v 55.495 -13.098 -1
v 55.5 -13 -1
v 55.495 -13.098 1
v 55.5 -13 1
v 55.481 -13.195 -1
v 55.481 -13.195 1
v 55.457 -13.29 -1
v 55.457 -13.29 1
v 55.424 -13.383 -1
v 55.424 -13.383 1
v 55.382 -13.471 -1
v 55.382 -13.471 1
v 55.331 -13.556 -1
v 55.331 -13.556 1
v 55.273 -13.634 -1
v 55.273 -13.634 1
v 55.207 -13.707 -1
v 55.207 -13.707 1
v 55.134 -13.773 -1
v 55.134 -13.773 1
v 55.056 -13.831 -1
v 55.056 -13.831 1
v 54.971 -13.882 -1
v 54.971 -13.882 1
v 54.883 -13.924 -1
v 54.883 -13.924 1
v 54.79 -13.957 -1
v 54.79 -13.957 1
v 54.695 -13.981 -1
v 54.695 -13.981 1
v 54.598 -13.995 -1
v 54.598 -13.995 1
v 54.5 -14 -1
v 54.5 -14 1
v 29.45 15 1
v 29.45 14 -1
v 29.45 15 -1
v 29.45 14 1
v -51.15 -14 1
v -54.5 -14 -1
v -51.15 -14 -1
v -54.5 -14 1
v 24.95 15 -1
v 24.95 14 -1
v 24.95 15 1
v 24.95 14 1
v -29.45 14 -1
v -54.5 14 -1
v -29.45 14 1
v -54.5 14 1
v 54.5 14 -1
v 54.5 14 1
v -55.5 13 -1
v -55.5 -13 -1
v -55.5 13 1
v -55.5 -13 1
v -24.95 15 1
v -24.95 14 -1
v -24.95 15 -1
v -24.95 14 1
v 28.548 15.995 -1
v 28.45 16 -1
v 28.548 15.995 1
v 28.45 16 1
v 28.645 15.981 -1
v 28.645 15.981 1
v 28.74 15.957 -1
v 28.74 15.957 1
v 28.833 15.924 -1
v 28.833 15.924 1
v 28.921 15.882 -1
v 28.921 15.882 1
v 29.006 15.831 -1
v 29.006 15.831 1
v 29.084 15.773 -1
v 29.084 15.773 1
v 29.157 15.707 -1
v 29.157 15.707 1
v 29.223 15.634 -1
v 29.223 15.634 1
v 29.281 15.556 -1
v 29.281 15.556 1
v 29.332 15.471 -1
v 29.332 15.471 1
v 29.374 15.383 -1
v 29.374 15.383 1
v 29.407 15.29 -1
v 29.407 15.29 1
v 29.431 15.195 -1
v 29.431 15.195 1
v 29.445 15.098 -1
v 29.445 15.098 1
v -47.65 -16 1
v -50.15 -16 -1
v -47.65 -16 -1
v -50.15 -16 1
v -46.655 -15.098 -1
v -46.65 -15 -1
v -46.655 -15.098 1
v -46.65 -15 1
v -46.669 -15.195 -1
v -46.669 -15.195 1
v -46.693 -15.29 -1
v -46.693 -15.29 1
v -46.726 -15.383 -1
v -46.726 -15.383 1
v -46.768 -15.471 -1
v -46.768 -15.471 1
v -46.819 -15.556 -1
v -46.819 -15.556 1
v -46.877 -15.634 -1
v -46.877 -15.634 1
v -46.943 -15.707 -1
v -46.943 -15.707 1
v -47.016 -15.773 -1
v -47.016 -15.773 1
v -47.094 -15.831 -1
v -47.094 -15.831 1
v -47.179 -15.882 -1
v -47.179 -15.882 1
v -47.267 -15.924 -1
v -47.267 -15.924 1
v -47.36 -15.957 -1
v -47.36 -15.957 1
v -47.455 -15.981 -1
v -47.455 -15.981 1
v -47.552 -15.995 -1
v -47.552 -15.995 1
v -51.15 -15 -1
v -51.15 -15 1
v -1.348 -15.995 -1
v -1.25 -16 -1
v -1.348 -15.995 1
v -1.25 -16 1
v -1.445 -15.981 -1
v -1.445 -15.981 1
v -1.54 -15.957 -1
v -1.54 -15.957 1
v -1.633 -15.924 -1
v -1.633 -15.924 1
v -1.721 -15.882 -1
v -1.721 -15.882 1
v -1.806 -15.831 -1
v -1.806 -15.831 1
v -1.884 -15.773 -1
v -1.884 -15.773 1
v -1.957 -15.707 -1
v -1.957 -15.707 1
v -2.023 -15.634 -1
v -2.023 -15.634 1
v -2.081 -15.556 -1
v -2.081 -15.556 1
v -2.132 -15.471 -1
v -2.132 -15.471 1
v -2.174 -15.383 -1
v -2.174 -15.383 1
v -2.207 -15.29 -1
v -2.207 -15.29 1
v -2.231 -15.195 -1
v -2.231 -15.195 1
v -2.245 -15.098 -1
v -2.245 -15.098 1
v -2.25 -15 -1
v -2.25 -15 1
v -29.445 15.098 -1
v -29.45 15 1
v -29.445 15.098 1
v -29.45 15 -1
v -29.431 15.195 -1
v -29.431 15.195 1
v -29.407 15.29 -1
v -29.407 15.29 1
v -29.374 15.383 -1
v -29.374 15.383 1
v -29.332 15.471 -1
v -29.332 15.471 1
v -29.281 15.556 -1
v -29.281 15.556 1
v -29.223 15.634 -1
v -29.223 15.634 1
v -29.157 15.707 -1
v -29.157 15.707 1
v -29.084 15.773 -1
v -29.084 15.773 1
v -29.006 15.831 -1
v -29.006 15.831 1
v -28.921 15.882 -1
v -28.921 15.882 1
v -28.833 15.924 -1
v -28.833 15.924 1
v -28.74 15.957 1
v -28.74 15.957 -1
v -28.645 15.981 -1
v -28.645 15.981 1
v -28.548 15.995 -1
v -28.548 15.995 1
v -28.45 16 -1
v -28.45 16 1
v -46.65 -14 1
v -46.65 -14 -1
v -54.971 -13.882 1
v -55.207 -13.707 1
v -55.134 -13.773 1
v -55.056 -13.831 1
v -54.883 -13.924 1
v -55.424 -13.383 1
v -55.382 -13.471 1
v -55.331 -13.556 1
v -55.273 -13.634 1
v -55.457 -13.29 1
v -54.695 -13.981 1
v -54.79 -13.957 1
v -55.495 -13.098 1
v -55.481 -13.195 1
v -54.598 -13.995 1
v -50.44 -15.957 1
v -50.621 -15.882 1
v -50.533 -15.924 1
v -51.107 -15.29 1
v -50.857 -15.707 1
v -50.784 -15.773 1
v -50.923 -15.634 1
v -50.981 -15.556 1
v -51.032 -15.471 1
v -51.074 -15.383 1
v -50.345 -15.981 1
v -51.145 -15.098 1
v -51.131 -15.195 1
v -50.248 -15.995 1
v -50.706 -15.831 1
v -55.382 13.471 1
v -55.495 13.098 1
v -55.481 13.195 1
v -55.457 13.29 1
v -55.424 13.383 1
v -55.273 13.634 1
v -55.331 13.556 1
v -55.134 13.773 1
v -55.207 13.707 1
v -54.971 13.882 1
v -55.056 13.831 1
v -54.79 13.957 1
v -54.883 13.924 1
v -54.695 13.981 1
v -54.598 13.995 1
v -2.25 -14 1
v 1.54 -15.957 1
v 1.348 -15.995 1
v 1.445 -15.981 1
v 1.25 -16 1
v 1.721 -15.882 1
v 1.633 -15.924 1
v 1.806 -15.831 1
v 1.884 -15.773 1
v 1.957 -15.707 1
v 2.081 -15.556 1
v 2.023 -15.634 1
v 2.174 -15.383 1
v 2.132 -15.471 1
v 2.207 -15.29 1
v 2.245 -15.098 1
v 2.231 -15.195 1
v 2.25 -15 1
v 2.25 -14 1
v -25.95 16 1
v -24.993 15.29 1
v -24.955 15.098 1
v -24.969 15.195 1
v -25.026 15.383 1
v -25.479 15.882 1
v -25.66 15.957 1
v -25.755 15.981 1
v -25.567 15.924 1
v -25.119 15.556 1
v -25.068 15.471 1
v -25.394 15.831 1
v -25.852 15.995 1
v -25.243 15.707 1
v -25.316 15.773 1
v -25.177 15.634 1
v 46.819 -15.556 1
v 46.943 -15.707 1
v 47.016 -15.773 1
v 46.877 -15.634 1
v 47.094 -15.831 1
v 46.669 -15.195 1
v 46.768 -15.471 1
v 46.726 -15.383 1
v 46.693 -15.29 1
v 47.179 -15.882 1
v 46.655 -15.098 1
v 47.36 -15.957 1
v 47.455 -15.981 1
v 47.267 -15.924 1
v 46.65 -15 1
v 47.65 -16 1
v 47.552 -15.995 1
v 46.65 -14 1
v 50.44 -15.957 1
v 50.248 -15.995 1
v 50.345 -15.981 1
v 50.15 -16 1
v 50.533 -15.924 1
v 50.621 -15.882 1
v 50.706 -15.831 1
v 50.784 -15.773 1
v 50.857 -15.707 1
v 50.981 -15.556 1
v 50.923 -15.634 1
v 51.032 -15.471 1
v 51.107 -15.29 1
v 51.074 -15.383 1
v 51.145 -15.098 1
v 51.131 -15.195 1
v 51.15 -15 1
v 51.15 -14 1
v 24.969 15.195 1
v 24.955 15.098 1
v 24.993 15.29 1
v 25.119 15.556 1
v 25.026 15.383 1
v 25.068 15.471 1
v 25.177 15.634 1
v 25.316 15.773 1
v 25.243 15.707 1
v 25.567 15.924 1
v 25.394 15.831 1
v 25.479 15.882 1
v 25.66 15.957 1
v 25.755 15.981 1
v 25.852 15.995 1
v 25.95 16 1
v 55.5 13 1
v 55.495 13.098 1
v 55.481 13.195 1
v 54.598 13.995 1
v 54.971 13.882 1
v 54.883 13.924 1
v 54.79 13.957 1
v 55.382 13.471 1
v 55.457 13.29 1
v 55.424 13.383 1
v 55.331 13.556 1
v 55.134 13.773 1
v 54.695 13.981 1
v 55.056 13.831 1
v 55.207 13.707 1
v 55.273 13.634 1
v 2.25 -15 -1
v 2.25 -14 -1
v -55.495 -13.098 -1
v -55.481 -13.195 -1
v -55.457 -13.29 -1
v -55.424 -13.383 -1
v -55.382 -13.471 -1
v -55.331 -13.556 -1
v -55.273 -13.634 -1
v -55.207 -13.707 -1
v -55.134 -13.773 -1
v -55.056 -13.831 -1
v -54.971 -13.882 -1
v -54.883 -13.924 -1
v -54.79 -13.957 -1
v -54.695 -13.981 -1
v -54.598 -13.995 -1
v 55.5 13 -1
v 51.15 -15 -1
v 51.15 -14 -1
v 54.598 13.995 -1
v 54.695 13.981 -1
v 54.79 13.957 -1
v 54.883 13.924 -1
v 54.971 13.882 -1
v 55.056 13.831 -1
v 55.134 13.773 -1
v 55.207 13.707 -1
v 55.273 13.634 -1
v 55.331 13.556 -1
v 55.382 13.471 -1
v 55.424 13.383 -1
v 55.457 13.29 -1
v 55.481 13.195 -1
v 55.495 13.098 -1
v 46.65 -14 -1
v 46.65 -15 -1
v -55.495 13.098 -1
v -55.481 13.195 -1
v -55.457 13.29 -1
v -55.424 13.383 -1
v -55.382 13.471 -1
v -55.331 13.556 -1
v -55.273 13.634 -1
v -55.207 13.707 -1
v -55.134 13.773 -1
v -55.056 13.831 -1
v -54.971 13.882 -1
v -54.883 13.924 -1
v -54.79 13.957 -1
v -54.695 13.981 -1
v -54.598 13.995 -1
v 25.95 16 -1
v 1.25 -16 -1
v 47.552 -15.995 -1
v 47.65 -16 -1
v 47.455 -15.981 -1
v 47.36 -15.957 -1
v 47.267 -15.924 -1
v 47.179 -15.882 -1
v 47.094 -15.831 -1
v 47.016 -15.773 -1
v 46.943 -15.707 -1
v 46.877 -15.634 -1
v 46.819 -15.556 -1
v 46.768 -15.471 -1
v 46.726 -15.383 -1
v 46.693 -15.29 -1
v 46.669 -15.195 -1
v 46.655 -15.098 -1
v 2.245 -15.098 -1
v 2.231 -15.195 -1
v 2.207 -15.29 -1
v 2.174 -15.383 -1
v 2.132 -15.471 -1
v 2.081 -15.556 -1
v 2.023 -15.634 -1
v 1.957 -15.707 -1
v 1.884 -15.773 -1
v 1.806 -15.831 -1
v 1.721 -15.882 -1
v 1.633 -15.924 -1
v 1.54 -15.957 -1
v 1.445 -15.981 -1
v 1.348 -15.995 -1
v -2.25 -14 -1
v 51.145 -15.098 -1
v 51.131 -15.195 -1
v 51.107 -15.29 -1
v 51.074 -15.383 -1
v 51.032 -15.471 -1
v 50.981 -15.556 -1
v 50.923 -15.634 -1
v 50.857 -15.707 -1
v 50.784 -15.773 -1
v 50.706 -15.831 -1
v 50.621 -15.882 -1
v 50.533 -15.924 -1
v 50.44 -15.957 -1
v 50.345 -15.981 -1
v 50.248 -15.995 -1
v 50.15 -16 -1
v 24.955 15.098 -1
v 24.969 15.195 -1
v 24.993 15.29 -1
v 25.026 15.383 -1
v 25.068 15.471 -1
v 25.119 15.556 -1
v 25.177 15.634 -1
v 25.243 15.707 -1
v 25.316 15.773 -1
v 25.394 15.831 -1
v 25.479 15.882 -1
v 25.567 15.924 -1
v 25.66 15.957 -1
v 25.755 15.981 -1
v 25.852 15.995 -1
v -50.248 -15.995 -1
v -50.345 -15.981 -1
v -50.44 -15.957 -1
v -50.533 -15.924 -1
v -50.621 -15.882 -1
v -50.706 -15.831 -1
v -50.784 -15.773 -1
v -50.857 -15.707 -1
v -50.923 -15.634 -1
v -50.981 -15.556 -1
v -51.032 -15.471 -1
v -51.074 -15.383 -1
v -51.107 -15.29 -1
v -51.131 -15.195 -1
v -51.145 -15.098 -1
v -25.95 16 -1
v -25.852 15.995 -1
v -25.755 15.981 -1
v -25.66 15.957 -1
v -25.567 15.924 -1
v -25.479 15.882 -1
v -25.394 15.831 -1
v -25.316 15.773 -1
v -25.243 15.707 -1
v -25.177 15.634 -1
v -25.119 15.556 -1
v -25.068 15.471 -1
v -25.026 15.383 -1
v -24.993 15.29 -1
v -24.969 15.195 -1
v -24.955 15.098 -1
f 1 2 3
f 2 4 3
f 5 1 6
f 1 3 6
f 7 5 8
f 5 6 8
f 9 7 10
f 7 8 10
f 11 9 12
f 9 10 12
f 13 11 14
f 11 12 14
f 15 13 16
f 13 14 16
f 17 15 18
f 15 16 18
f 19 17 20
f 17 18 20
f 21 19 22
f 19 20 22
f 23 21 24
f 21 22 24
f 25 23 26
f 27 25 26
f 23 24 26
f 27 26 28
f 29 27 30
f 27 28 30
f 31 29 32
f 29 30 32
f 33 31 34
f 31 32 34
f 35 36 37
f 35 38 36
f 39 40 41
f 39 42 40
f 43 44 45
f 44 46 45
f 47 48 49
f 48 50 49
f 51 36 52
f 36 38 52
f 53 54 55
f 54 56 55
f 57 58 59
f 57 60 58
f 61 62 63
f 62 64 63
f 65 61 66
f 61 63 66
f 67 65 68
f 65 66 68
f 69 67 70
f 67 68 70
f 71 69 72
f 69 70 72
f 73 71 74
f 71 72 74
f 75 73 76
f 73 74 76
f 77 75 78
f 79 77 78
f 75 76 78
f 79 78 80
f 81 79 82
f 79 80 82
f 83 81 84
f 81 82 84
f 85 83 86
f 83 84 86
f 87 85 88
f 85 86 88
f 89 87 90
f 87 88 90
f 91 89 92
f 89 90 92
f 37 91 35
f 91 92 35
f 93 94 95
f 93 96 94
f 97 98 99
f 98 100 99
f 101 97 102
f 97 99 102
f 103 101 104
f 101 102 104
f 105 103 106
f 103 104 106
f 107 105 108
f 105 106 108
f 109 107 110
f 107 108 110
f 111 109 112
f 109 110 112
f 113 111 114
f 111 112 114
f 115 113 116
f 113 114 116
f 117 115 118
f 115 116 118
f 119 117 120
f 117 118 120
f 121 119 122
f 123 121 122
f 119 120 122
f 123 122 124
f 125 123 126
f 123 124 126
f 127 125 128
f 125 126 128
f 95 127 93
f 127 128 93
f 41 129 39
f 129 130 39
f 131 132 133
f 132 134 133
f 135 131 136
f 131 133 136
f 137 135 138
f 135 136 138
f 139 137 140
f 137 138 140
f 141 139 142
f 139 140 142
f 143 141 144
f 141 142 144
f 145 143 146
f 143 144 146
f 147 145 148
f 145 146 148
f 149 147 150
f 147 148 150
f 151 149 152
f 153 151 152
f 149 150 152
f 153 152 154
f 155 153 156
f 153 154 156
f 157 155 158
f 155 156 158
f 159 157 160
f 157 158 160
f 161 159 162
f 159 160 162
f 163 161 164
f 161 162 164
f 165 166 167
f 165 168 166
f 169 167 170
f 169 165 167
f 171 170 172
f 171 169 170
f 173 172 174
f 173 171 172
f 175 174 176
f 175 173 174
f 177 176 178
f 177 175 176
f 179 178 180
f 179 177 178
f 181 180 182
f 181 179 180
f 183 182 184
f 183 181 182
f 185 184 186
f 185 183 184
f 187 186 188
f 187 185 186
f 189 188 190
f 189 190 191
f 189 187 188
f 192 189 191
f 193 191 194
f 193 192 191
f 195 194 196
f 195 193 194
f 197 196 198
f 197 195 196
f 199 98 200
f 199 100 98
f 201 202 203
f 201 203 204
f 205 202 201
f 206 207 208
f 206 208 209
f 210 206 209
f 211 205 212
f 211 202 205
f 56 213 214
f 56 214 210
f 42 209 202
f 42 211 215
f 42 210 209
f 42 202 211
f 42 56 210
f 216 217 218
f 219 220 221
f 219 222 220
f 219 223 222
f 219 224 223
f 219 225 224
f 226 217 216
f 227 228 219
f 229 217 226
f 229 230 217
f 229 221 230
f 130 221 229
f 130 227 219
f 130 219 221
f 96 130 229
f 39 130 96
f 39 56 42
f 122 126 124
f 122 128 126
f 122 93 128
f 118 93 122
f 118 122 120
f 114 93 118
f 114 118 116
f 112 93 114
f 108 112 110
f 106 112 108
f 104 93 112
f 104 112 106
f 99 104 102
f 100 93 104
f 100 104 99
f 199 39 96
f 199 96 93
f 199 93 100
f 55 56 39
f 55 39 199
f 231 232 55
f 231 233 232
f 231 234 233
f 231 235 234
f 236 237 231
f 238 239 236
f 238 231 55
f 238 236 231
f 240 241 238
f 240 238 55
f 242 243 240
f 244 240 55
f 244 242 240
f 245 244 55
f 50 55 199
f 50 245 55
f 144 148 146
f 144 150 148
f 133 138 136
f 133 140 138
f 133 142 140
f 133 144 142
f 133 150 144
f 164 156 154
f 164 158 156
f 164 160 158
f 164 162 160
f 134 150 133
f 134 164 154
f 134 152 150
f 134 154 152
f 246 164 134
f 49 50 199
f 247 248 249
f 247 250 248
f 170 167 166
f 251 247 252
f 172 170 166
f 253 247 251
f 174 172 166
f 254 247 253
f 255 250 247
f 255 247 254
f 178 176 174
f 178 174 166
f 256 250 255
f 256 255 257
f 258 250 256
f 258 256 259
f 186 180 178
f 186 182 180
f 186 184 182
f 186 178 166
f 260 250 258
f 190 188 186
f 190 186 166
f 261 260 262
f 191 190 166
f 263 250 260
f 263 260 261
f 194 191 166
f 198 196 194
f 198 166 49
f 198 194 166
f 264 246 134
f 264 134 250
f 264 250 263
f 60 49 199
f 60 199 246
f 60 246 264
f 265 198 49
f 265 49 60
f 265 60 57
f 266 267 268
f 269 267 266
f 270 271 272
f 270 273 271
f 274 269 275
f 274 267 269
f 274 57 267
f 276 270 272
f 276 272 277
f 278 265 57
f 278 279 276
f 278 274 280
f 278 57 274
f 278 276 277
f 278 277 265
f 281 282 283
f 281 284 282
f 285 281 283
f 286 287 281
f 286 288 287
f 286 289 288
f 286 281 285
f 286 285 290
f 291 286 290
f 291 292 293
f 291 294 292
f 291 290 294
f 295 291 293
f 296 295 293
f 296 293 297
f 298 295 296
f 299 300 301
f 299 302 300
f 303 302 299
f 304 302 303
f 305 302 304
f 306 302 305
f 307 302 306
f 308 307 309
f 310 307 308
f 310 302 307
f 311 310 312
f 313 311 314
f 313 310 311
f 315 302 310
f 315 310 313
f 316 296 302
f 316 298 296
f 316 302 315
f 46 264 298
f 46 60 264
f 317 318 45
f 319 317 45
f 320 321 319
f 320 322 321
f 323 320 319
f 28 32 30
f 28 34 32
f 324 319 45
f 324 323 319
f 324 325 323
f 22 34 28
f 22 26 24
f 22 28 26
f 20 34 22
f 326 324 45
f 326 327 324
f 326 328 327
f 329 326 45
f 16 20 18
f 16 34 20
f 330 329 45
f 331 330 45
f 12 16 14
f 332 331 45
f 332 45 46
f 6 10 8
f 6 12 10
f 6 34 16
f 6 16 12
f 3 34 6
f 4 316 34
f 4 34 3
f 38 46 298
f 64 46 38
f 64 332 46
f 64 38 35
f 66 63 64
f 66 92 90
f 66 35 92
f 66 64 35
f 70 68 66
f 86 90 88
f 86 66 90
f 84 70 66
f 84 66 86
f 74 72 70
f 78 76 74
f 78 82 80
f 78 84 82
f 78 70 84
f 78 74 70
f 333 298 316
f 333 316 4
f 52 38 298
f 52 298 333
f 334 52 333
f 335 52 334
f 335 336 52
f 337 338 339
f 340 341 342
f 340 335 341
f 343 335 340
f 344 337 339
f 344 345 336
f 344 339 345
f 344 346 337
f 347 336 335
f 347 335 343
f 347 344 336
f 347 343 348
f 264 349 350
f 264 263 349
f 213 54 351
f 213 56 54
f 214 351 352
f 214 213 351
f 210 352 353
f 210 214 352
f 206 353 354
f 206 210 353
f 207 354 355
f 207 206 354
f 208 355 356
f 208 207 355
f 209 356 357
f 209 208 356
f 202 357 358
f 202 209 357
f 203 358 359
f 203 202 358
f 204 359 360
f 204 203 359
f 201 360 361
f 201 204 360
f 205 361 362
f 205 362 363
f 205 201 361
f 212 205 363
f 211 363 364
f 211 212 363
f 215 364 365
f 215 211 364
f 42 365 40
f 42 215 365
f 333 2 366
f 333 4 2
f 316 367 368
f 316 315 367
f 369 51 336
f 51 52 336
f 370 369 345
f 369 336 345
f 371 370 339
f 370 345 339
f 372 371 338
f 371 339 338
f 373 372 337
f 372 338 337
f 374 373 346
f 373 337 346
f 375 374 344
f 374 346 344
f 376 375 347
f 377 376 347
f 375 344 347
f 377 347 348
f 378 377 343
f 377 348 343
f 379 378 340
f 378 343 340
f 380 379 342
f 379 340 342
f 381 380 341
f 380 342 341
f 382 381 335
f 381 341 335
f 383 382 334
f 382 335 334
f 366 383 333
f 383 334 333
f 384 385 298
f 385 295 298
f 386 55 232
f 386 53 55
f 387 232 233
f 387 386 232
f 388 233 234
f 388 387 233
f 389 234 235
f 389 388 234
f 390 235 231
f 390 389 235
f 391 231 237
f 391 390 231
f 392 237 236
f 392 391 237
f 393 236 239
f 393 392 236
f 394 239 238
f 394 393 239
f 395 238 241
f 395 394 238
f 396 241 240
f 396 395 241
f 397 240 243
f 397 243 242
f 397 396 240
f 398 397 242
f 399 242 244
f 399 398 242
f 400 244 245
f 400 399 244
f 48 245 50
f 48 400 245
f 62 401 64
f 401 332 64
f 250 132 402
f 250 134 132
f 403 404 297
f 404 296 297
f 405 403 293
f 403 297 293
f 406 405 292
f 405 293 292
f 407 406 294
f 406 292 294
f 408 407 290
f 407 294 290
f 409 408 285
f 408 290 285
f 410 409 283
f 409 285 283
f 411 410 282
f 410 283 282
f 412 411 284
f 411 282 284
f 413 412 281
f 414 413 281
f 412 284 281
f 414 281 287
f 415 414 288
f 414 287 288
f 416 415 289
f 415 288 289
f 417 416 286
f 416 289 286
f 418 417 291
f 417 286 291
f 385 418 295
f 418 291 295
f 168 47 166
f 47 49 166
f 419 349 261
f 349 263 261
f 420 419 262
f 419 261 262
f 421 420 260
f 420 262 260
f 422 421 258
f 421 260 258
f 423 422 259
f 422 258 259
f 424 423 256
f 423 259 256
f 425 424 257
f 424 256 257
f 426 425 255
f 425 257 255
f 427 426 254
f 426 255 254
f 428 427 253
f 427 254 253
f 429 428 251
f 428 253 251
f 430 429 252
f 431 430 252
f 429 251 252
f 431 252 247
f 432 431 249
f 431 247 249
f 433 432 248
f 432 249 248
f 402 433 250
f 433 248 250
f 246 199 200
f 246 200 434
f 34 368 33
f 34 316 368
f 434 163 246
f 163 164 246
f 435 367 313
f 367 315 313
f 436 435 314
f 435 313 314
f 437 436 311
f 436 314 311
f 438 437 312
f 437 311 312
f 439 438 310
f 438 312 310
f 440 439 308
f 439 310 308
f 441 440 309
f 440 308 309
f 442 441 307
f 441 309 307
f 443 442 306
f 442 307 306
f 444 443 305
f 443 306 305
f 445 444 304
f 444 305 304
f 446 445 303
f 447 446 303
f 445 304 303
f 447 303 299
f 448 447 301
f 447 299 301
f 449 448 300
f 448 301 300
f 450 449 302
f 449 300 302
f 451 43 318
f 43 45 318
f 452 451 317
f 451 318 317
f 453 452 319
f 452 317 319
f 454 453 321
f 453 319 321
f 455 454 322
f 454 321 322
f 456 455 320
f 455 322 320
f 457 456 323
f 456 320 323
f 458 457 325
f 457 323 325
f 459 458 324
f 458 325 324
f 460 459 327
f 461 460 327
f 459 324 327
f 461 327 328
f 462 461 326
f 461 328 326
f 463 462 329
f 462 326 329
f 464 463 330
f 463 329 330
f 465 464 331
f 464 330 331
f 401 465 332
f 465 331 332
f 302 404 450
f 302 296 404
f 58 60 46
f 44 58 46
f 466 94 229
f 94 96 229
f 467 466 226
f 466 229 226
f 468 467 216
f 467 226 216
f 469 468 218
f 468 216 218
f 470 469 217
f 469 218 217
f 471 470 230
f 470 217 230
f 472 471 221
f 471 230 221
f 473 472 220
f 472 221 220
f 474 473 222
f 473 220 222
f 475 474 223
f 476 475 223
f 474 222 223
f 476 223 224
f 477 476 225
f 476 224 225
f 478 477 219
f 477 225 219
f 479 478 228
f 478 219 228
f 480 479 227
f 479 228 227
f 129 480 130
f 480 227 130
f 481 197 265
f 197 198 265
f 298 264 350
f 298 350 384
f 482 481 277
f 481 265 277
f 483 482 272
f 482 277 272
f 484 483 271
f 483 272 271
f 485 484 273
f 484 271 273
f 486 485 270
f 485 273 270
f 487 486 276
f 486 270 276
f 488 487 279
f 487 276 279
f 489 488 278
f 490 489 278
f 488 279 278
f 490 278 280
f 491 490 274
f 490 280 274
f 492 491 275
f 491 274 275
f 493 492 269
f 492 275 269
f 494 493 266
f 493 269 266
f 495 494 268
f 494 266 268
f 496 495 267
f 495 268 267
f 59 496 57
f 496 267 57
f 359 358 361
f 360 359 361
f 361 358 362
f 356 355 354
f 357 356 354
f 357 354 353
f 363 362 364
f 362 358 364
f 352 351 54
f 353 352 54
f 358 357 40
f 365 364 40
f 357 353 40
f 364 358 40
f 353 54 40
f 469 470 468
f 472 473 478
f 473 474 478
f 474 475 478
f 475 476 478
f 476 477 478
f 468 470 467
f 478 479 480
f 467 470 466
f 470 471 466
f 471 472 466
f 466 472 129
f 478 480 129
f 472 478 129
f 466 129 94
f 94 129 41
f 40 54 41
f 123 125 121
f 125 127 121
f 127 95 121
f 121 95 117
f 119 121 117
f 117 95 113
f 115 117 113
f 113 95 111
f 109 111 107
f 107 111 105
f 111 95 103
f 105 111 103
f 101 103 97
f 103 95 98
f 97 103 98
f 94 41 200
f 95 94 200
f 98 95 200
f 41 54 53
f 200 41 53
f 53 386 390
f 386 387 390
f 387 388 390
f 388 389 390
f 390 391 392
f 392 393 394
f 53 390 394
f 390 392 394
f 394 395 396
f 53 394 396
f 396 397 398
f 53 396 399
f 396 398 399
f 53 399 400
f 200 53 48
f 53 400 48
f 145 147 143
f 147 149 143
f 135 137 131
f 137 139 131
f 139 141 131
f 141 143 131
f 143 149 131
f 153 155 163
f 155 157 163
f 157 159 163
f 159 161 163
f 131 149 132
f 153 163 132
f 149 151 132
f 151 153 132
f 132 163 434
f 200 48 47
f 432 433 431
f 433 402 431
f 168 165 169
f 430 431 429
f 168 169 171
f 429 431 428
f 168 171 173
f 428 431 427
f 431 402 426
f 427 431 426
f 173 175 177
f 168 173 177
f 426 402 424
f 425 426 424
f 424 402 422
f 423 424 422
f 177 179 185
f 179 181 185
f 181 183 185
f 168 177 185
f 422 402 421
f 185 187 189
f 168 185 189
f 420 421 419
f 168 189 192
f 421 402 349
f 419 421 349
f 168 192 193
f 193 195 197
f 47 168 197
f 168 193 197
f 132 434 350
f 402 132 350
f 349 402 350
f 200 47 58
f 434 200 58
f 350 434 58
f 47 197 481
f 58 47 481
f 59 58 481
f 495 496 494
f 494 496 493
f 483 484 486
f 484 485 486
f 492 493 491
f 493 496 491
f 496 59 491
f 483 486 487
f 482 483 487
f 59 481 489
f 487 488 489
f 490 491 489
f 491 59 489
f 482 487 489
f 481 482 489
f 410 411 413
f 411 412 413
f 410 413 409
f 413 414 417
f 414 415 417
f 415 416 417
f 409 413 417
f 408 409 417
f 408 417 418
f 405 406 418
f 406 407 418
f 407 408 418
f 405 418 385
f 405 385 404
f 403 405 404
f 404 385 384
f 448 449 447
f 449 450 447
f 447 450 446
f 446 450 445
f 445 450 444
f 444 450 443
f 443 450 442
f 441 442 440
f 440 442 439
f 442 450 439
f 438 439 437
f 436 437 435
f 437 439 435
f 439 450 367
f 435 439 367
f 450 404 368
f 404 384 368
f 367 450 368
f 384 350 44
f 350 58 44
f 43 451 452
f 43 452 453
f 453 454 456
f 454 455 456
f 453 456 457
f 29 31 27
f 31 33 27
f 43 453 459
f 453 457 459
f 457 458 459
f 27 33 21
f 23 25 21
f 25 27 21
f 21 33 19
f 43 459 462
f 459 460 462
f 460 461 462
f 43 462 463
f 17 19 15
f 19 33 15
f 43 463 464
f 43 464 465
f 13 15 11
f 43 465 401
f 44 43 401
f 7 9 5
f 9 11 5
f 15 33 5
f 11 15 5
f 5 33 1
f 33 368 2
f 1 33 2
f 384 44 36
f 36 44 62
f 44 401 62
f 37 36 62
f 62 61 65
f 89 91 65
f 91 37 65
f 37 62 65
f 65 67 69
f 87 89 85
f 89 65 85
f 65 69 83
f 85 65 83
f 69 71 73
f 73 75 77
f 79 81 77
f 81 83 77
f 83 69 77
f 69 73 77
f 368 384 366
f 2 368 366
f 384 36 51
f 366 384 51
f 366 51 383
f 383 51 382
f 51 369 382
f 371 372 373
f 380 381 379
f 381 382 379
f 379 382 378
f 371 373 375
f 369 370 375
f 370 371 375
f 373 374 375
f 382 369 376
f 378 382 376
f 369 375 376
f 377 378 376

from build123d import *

# Parameters (mm, degrees)
SKETCH1_W           = 111
SKETCH1_H           = 28
SKETCH1_W_2         = 4.5
SKETCH1_H_2         = 2
BOSS_EXTRUDE1_DEPTH = 1
FILLET1_R           = 1


with BuildPart() as part:
    # Sketch1 → Boss-Extrude1 (new, symmetric)
    with BuildSketch(Plane.XY):
        Rectangle(SKETCH1_W, SKETCH1_H)
        with Locations((0, -15)):
            Rectangle(SKETCH1_W_2, SKETCH1_H_2)
        with Locations((27.2, 15)):
            Rectangle(SKETCH1_W_2, SKETCH1_H_2)
        with Locations((-27.2, 15)):
            Rectangle(SKETCH1_W_2, SKETCH1_H_2)
        with Locations((-48.9, -15)):
            Rectangle(SKETCH1_W_2, SKETCH1_H_2)
        with Locations((48.9, -15)):
            Rectangle(SKETCH1_W_2, SKETCH1_H_2)
    extrude(amount=BOSS_EXTRUDE1_DEPTH, both=True)

    # Fillet1
    fillet1_edges = [part.edges().sort_by_distance(p)[0] for p in [
        (55.5, -14, 0),
        (2.25, -16, 0),
        (-2.25, -16, 0),
        (-55.5, -14, 0),
        (-55.5, 14, 0),
        (-29.45, 16, 0),
        (-24.95, 16, 0),
        (24.95, 16, 0),
        (29.45, 16, 0),
        (55.5, 14, 0),
        (-51.15, -16, 0),
        (-46.65, -16, 0),
        (46.65, -16, 0),
        (51.15, -16, 0),
    ]]
    fillet(fillet1_edges, radius=FILLET1_R)


solid = part.part
